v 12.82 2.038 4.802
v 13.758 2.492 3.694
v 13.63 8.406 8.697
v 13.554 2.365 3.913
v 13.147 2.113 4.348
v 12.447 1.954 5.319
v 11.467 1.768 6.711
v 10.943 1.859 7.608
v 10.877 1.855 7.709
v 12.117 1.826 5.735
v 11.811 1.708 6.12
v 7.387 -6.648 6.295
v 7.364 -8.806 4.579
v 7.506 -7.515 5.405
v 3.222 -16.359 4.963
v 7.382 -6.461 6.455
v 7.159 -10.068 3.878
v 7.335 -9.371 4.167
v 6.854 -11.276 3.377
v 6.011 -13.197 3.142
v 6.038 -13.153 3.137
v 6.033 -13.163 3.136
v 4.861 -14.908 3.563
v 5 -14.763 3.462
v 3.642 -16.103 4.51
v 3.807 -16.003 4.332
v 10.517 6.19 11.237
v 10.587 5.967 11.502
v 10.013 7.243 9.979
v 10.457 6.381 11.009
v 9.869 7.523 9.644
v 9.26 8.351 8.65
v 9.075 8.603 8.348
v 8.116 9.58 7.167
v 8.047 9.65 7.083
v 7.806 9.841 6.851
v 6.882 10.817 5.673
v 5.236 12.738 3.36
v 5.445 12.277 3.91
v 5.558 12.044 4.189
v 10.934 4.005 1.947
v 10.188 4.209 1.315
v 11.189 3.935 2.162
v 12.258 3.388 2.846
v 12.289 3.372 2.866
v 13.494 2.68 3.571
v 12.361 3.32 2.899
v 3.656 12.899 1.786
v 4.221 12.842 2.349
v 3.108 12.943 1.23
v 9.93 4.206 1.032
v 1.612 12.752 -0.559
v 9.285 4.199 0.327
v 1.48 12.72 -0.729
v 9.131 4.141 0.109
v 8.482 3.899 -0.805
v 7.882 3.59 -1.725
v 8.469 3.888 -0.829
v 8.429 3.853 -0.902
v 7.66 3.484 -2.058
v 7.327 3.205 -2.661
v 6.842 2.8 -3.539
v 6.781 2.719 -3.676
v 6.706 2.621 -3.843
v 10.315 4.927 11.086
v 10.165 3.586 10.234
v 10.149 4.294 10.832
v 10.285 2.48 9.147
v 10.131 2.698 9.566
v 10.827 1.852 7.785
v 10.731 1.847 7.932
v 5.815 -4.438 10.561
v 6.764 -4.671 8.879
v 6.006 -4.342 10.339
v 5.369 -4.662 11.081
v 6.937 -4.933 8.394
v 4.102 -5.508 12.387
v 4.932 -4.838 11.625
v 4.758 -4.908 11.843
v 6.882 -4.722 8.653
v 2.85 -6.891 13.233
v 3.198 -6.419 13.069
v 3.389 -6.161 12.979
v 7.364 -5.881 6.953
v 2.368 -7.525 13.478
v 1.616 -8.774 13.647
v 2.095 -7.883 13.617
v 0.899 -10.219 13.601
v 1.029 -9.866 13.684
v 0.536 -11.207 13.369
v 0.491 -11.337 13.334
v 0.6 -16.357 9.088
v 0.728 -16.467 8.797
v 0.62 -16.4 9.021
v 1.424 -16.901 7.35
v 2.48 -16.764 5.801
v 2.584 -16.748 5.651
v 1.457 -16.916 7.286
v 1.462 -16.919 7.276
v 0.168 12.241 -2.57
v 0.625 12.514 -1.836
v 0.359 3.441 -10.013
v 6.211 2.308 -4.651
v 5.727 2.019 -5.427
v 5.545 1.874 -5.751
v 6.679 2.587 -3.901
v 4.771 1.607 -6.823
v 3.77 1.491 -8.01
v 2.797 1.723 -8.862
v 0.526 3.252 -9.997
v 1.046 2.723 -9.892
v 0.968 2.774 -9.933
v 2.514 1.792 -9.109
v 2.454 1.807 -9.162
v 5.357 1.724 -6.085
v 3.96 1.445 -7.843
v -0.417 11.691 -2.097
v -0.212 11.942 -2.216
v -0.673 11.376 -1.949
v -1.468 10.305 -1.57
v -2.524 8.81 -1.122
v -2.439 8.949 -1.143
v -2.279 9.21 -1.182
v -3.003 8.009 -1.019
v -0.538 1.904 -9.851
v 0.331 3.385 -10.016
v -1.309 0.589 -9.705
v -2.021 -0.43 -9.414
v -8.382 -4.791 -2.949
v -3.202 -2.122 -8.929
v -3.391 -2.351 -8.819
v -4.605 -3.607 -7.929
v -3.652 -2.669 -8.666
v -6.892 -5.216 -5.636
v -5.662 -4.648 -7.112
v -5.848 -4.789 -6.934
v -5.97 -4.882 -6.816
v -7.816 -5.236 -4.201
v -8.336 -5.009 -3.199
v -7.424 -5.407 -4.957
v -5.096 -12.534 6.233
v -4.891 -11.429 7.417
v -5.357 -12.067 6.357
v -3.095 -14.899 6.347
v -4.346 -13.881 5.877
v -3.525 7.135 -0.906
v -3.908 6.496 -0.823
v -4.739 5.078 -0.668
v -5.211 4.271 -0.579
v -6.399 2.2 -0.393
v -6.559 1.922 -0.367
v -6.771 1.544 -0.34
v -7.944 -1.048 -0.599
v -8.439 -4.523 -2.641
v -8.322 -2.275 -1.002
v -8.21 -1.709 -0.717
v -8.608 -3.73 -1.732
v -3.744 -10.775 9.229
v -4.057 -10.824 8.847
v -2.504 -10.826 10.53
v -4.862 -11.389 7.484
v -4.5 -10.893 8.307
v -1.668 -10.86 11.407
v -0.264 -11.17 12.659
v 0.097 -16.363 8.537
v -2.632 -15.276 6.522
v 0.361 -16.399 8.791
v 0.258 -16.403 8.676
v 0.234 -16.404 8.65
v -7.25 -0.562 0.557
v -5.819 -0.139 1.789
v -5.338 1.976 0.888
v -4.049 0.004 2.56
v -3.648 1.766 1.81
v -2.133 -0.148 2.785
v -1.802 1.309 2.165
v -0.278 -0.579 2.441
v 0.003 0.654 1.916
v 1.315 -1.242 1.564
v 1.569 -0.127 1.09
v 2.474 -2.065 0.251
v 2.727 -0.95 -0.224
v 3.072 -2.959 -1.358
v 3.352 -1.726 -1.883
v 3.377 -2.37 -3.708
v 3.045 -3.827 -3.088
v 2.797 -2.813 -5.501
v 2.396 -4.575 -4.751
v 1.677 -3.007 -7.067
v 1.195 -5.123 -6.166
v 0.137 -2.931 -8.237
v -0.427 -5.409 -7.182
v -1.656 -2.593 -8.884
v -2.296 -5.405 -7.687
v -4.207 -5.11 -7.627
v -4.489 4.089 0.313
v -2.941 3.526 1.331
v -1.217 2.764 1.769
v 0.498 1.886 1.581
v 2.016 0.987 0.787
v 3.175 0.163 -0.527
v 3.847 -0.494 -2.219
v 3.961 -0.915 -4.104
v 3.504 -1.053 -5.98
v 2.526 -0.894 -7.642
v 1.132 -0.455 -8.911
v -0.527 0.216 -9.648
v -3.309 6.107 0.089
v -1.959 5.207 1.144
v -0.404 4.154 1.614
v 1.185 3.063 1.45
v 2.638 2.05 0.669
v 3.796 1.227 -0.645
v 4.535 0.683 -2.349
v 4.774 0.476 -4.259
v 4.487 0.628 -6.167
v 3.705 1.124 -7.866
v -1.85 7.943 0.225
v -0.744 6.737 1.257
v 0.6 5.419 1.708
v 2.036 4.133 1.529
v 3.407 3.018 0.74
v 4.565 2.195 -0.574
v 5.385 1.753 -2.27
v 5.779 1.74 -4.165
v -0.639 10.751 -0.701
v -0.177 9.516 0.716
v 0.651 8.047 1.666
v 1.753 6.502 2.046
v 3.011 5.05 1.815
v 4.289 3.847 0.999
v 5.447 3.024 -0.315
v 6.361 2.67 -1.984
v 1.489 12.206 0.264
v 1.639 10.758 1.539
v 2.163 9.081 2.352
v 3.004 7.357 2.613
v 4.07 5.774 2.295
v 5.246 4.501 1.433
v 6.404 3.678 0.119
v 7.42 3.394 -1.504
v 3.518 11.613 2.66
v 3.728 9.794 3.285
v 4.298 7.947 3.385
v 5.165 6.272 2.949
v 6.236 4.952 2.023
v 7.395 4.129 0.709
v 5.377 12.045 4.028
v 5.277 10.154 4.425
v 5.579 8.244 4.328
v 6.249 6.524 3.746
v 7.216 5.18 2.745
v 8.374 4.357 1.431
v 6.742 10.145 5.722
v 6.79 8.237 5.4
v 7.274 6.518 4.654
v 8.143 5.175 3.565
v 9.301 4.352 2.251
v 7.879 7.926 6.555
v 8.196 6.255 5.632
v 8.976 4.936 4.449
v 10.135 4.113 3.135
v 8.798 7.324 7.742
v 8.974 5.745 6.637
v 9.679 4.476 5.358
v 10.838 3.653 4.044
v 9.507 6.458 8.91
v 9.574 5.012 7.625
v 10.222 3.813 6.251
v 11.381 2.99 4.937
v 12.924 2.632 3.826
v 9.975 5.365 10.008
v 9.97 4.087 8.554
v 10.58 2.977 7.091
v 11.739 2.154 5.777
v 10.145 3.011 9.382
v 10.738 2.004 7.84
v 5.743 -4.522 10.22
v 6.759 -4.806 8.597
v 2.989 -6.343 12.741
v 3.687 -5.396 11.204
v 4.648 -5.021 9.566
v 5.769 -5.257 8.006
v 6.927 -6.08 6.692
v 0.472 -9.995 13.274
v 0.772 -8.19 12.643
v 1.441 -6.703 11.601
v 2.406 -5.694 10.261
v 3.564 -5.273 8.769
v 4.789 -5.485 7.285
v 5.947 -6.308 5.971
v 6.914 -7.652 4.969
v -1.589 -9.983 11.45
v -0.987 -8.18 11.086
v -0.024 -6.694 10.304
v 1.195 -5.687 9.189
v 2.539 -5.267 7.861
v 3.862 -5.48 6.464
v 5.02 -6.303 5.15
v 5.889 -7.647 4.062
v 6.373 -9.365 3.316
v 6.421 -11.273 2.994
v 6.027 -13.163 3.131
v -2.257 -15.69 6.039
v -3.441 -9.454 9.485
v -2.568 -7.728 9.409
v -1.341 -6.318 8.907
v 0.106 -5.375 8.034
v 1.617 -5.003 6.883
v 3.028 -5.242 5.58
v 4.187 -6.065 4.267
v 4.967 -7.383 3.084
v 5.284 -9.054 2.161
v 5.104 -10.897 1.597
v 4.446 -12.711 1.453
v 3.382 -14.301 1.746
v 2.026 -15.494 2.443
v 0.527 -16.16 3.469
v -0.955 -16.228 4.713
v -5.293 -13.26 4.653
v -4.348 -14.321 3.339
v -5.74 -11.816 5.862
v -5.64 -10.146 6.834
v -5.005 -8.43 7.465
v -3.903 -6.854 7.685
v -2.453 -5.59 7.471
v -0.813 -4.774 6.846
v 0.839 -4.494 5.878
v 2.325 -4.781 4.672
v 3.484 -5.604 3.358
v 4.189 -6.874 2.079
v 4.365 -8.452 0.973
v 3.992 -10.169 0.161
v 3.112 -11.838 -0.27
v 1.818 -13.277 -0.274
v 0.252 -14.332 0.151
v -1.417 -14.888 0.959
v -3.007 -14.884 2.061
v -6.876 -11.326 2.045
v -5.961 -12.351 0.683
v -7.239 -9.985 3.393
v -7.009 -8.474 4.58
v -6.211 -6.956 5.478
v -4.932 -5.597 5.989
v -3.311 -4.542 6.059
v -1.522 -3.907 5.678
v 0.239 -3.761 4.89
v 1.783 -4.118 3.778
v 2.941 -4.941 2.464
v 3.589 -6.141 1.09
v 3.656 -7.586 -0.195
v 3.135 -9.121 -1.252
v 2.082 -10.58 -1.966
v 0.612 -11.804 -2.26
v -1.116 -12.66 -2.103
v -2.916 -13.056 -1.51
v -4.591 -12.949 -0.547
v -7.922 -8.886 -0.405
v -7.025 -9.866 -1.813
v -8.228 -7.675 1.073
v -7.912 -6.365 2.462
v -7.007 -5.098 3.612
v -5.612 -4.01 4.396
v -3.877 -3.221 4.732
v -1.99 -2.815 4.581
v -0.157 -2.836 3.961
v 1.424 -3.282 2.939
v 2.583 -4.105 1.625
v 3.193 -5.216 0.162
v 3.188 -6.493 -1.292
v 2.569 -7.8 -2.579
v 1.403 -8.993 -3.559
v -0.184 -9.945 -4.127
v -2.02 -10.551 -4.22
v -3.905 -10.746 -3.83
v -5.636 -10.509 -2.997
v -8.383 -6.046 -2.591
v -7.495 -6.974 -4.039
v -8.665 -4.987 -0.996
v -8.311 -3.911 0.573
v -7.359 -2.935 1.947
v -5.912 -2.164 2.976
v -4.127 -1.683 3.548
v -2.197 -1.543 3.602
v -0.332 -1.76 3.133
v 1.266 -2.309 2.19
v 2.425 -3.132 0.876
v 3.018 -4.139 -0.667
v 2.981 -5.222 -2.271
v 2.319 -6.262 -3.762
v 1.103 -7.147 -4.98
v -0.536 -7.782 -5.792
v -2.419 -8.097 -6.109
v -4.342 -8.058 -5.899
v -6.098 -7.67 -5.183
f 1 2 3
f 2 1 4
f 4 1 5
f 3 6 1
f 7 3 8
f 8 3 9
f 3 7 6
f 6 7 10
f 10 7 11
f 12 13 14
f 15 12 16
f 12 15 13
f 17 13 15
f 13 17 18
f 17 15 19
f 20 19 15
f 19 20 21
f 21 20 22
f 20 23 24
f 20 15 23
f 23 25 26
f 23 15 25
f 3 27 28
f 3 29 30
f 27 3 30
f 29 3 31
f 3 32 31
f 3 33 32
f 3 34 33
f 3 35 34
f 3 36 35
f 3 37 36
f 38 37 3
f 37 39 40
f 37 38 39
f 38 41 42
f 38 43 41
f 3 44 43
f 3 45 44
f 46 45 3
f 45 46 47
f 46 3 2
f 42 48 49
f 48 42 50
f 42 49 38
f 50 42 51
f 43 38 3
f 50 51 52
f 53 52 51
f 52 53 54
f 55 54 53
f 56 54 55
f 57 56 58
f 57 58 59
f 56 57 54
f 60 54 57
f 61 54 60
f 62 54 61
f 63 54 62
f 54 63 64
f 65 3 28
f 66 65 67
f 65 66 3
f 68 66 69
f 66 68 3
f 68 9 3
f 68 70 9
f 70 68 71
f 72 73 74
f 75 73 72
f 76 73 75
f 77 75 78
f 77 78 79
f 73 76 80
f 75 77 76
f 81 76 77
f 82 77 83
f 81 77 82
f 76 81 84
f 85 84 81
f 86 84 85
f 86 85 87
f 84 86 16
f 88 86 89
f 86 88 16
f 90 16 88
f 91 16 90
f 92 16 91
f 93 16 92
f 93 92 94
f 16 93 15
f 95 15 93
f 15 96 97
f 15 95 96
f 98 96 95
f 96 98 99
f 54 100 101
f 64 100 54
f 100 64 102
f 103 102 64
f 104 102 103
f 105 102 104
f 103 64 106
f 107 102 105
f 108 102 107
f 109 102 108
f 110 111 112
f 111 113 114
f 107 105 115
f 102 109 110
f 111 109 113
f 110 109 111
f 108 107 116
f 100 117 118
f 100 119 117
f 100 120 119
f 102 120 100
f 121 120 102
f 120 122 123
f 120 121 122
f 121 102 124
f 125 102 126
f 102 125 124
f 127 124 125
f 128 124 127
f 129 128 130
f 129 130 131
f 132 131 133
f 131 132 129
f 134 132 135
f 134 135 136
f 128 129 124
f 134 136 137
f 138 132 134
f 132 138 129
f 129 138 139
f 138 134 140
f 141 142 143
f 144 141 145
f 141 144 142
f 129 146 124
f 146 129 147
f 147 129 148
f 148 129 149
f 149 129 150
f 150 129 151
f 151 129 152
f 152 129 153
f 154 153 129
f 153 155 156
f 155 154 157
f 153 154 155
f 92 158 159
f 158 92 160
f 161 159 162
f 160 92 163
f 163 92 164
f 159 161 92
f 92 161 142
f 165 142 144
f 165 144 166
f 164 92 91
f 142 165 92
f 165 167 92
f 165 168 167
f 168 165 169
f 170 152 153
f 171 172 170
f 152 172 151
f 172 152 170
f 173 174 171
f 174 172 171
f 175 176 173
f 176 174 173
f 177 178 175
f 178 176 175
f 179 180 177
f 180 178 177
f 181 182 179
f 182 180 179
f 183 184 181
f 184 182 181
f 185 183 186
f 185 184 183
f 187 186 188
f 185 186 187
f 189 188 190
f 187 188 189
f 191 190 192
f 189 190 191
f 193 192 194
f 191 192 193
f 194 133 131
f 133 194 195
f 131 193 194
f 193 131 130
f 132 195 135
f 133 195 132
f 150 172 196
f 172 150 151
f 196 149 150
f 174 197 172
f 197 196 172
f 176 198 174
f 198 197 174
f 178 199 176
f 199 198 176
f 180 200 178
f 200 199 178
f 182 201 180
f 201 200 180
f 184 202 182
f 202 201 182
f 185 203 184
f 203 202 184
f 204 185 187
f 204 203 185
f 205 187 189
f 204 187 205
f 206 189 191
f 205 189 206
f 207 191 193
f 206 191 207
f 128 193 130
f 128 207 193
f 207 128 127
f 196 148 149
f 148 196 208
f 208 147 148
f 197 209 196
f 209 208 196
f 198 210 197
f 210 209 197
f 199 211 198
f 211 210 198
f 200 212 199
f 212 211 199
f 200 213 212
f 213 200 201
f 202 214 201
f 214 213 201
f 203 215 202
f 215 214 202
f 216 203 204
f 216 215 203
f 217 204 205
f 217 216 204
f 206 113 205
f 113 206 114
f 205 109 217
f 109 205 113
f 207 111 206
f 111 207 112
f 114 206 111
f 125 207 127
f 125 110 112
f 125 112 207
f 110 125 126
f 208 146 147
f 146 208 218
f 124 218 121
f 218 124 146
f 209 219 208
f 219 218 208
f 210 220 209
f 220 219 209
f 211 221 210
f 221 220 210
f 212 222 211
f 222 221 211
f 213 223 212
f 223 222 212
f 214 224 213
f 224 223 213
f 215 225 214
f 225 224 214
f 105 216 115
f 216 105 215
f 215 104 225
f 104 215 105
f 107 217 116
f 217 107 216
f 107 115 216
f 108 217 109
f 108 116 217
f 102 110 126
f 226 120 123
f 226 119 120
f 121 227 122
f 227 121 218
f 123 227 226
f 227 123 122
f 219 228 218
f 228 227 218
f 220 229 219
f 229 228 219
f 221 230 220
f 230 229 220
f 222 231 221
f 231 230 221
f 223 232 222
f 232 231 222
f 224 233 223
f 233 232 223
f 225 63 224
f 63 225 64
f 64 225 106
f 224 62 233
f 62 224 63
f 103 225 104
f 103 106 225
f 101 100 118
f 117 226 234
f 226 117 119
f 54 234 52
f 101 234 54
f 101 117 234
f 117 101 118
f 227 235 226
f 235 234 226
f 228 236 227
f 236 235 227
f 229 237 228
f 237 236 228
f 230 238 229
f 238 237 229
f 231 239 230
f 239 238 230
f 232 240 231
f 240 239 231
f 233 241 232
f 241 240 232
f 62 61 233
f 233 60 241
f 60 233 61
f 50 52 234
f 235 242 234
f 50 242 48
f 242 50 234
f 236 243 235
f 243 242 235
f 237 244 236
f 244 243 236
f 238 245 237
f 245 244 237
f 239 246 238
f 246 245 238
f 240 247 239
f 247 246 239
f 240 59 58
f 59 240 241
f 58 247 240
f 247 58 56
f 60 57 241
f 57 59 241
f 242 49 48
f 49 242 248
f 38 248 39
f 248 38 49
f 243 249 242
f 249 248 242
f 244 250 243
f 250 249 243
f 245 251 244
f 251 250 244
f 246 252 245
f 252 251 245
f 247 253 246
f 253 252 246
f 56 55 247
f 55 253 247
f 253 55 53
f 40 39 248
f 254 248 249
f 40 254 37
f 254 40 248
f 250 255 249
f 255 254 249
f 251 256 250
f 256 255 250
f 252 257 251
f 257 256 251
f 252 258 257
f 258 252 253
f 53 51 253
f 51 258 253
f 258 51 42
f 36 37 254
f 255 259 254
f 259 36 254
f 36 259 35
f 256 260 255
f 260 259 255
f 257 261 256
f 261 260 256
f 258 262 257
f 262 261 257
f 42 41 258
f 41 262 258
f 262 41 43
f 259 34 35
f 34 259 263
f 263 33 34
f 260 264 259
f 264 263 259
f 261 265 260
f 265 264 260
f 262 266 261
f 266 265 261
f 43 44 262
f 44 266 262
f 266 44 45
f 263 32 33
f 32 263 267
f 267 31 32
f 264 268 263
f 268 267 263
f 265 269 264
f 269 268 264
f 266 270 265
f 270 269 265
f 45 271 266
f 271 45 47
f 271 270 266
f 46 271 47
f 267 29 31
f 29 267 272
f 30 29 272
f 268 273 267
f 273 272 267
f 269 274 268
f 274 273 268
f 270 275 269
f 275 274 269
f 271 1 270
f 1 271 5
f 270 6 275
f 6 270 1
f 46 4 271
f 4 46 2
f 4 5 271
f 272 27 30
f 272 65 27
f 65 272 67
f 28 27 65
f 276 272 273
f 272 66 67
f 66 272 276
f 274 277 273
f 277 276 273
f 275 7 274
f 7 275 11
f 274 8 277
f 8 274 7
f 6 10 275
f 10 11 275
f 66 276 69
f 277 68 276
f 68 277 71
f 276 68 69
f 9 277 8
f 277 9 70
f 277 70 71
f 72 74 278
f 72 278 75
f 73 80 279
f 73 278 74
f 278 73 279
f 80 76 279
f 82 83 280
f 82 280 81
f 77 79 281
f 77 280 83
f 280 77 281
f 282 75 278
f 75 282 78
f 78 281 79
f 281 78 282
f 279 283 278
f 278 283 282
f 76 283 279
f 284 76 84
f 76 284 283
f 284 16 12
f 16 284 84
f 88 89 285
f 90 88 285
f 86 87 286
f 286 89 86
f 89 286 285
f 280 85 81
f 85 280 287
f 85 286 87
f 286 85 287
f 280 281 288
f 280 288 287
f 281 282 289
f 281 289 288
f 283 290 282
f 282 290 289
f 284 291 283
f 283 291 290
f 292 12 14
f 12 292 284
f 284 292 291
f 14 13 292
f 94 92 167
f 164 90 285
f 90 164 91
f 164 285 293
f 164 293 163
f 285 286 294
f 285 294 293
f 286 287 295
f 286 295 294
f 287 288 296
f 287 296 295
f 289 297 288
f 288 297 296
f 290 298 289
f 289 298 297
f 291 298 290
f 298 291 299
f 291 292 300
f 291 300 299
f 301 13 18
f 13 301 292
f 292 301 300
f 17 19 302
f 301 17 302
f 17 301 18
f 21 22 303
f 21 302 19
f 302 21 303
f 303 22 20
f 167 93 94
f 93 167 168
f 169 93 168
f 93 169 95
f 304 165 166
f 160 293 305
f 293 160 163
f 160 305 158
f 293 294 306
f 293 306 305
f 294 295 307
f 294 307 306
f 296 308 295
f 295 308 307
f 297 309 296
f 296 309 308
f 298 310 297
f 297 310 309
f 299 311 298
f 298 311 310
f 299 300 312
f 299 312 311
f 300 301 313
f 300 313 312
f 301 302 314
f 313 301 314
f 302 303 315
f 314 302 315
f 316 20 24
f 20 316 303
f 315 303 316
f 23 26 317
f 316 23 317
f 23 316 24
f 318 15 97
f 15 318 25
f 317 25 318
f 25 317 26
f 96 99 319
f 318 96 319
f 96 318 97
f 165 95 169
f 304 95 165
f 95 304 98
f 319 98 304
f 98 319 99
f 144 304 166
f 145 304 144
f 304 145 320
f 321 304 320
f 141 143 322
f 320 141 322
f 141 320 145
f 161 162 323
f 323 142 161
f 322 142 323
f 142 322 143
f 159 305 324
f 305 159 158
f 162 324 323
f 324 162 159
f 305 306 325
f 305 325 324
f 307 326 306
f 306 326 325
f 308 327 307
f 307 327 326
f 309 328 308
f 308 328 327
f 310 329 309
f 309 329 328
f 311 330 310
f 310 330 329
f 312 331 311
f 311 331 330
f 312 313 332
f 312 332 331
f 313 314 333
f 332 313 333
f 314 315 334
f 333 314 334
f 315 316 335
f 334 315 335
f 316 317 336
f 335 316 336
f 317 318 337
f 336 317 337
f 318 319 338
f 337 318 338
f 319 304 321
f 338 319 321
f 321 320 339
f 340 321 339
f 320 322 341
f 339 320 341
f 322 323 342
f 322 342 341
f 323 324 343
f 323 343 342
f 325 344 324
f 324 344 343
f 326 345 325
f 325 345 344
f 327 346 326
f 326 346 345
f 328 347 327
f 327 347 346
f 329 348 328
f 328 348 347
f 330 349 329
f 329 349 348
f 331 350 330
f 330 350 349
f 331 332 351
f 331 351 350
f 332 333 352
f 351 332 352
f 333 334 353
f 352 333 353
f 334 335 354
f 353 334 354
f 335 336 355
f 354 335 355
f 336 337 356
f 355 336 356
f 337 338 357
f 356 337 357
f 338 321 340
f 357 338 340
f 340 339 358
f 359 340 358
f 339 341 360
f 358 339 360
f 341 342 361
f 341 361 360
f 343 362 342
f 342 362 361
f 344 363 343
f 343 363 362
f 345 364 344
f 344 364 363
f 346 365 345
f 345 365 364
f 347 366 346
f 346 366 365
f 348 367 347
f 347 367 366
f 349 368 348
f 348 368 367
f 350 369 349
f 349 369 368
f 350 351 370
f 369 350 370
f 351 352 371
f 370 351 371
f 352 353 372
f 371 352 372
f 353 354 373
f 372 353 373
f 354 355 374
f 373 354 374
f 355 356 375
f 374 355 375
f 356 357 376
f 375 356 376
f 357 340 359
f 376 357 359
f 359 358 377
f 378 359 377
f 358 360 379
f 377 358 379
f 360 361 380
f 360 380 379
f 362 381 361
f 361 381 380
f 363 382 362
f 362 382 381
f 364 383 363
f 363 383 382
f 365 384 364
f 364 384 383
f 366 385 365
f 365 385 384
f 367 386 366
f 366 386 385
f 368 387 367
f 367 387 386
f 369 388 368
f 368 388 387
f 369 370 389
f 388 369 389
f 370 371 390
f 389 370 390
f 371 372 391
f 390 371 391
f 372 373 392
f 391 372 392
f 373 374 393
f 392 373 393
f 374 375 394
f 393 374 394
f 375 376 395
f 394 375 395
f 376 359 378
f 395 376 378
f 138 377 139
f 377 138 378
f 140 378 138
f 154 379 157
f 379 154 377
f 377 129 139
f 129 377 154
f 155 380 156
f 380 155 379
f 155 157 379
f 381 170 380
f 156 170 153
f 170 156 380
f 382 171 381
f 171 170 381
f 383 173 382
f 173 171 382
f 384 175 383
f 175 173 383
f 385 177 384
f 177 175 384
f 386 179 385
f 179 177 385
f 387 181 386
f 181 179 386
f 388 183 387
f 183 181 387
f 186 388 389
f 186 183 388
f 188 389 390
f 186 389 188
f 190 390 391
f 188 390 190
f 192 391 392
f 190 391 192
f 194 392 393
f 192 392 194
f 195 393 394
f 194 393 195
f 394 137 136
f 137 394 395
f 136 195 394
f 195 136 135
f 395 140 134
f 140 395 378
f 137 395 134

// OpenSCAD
 
intersection (){
rotate(rands(-60,60,3))translate(rands(-10,10,3))cube(rands(10,40,3),center=true );
rotate(rands(-60,60,3))translate(rands(-10,10,3))torus(rands(10,20,1) [0],rands(3,10,1) [0]) ;
}
 


module torus(a,b)                  {
    
    rotate_extrude(convexity=100)translate([a,0,0])circle(b);
    }
